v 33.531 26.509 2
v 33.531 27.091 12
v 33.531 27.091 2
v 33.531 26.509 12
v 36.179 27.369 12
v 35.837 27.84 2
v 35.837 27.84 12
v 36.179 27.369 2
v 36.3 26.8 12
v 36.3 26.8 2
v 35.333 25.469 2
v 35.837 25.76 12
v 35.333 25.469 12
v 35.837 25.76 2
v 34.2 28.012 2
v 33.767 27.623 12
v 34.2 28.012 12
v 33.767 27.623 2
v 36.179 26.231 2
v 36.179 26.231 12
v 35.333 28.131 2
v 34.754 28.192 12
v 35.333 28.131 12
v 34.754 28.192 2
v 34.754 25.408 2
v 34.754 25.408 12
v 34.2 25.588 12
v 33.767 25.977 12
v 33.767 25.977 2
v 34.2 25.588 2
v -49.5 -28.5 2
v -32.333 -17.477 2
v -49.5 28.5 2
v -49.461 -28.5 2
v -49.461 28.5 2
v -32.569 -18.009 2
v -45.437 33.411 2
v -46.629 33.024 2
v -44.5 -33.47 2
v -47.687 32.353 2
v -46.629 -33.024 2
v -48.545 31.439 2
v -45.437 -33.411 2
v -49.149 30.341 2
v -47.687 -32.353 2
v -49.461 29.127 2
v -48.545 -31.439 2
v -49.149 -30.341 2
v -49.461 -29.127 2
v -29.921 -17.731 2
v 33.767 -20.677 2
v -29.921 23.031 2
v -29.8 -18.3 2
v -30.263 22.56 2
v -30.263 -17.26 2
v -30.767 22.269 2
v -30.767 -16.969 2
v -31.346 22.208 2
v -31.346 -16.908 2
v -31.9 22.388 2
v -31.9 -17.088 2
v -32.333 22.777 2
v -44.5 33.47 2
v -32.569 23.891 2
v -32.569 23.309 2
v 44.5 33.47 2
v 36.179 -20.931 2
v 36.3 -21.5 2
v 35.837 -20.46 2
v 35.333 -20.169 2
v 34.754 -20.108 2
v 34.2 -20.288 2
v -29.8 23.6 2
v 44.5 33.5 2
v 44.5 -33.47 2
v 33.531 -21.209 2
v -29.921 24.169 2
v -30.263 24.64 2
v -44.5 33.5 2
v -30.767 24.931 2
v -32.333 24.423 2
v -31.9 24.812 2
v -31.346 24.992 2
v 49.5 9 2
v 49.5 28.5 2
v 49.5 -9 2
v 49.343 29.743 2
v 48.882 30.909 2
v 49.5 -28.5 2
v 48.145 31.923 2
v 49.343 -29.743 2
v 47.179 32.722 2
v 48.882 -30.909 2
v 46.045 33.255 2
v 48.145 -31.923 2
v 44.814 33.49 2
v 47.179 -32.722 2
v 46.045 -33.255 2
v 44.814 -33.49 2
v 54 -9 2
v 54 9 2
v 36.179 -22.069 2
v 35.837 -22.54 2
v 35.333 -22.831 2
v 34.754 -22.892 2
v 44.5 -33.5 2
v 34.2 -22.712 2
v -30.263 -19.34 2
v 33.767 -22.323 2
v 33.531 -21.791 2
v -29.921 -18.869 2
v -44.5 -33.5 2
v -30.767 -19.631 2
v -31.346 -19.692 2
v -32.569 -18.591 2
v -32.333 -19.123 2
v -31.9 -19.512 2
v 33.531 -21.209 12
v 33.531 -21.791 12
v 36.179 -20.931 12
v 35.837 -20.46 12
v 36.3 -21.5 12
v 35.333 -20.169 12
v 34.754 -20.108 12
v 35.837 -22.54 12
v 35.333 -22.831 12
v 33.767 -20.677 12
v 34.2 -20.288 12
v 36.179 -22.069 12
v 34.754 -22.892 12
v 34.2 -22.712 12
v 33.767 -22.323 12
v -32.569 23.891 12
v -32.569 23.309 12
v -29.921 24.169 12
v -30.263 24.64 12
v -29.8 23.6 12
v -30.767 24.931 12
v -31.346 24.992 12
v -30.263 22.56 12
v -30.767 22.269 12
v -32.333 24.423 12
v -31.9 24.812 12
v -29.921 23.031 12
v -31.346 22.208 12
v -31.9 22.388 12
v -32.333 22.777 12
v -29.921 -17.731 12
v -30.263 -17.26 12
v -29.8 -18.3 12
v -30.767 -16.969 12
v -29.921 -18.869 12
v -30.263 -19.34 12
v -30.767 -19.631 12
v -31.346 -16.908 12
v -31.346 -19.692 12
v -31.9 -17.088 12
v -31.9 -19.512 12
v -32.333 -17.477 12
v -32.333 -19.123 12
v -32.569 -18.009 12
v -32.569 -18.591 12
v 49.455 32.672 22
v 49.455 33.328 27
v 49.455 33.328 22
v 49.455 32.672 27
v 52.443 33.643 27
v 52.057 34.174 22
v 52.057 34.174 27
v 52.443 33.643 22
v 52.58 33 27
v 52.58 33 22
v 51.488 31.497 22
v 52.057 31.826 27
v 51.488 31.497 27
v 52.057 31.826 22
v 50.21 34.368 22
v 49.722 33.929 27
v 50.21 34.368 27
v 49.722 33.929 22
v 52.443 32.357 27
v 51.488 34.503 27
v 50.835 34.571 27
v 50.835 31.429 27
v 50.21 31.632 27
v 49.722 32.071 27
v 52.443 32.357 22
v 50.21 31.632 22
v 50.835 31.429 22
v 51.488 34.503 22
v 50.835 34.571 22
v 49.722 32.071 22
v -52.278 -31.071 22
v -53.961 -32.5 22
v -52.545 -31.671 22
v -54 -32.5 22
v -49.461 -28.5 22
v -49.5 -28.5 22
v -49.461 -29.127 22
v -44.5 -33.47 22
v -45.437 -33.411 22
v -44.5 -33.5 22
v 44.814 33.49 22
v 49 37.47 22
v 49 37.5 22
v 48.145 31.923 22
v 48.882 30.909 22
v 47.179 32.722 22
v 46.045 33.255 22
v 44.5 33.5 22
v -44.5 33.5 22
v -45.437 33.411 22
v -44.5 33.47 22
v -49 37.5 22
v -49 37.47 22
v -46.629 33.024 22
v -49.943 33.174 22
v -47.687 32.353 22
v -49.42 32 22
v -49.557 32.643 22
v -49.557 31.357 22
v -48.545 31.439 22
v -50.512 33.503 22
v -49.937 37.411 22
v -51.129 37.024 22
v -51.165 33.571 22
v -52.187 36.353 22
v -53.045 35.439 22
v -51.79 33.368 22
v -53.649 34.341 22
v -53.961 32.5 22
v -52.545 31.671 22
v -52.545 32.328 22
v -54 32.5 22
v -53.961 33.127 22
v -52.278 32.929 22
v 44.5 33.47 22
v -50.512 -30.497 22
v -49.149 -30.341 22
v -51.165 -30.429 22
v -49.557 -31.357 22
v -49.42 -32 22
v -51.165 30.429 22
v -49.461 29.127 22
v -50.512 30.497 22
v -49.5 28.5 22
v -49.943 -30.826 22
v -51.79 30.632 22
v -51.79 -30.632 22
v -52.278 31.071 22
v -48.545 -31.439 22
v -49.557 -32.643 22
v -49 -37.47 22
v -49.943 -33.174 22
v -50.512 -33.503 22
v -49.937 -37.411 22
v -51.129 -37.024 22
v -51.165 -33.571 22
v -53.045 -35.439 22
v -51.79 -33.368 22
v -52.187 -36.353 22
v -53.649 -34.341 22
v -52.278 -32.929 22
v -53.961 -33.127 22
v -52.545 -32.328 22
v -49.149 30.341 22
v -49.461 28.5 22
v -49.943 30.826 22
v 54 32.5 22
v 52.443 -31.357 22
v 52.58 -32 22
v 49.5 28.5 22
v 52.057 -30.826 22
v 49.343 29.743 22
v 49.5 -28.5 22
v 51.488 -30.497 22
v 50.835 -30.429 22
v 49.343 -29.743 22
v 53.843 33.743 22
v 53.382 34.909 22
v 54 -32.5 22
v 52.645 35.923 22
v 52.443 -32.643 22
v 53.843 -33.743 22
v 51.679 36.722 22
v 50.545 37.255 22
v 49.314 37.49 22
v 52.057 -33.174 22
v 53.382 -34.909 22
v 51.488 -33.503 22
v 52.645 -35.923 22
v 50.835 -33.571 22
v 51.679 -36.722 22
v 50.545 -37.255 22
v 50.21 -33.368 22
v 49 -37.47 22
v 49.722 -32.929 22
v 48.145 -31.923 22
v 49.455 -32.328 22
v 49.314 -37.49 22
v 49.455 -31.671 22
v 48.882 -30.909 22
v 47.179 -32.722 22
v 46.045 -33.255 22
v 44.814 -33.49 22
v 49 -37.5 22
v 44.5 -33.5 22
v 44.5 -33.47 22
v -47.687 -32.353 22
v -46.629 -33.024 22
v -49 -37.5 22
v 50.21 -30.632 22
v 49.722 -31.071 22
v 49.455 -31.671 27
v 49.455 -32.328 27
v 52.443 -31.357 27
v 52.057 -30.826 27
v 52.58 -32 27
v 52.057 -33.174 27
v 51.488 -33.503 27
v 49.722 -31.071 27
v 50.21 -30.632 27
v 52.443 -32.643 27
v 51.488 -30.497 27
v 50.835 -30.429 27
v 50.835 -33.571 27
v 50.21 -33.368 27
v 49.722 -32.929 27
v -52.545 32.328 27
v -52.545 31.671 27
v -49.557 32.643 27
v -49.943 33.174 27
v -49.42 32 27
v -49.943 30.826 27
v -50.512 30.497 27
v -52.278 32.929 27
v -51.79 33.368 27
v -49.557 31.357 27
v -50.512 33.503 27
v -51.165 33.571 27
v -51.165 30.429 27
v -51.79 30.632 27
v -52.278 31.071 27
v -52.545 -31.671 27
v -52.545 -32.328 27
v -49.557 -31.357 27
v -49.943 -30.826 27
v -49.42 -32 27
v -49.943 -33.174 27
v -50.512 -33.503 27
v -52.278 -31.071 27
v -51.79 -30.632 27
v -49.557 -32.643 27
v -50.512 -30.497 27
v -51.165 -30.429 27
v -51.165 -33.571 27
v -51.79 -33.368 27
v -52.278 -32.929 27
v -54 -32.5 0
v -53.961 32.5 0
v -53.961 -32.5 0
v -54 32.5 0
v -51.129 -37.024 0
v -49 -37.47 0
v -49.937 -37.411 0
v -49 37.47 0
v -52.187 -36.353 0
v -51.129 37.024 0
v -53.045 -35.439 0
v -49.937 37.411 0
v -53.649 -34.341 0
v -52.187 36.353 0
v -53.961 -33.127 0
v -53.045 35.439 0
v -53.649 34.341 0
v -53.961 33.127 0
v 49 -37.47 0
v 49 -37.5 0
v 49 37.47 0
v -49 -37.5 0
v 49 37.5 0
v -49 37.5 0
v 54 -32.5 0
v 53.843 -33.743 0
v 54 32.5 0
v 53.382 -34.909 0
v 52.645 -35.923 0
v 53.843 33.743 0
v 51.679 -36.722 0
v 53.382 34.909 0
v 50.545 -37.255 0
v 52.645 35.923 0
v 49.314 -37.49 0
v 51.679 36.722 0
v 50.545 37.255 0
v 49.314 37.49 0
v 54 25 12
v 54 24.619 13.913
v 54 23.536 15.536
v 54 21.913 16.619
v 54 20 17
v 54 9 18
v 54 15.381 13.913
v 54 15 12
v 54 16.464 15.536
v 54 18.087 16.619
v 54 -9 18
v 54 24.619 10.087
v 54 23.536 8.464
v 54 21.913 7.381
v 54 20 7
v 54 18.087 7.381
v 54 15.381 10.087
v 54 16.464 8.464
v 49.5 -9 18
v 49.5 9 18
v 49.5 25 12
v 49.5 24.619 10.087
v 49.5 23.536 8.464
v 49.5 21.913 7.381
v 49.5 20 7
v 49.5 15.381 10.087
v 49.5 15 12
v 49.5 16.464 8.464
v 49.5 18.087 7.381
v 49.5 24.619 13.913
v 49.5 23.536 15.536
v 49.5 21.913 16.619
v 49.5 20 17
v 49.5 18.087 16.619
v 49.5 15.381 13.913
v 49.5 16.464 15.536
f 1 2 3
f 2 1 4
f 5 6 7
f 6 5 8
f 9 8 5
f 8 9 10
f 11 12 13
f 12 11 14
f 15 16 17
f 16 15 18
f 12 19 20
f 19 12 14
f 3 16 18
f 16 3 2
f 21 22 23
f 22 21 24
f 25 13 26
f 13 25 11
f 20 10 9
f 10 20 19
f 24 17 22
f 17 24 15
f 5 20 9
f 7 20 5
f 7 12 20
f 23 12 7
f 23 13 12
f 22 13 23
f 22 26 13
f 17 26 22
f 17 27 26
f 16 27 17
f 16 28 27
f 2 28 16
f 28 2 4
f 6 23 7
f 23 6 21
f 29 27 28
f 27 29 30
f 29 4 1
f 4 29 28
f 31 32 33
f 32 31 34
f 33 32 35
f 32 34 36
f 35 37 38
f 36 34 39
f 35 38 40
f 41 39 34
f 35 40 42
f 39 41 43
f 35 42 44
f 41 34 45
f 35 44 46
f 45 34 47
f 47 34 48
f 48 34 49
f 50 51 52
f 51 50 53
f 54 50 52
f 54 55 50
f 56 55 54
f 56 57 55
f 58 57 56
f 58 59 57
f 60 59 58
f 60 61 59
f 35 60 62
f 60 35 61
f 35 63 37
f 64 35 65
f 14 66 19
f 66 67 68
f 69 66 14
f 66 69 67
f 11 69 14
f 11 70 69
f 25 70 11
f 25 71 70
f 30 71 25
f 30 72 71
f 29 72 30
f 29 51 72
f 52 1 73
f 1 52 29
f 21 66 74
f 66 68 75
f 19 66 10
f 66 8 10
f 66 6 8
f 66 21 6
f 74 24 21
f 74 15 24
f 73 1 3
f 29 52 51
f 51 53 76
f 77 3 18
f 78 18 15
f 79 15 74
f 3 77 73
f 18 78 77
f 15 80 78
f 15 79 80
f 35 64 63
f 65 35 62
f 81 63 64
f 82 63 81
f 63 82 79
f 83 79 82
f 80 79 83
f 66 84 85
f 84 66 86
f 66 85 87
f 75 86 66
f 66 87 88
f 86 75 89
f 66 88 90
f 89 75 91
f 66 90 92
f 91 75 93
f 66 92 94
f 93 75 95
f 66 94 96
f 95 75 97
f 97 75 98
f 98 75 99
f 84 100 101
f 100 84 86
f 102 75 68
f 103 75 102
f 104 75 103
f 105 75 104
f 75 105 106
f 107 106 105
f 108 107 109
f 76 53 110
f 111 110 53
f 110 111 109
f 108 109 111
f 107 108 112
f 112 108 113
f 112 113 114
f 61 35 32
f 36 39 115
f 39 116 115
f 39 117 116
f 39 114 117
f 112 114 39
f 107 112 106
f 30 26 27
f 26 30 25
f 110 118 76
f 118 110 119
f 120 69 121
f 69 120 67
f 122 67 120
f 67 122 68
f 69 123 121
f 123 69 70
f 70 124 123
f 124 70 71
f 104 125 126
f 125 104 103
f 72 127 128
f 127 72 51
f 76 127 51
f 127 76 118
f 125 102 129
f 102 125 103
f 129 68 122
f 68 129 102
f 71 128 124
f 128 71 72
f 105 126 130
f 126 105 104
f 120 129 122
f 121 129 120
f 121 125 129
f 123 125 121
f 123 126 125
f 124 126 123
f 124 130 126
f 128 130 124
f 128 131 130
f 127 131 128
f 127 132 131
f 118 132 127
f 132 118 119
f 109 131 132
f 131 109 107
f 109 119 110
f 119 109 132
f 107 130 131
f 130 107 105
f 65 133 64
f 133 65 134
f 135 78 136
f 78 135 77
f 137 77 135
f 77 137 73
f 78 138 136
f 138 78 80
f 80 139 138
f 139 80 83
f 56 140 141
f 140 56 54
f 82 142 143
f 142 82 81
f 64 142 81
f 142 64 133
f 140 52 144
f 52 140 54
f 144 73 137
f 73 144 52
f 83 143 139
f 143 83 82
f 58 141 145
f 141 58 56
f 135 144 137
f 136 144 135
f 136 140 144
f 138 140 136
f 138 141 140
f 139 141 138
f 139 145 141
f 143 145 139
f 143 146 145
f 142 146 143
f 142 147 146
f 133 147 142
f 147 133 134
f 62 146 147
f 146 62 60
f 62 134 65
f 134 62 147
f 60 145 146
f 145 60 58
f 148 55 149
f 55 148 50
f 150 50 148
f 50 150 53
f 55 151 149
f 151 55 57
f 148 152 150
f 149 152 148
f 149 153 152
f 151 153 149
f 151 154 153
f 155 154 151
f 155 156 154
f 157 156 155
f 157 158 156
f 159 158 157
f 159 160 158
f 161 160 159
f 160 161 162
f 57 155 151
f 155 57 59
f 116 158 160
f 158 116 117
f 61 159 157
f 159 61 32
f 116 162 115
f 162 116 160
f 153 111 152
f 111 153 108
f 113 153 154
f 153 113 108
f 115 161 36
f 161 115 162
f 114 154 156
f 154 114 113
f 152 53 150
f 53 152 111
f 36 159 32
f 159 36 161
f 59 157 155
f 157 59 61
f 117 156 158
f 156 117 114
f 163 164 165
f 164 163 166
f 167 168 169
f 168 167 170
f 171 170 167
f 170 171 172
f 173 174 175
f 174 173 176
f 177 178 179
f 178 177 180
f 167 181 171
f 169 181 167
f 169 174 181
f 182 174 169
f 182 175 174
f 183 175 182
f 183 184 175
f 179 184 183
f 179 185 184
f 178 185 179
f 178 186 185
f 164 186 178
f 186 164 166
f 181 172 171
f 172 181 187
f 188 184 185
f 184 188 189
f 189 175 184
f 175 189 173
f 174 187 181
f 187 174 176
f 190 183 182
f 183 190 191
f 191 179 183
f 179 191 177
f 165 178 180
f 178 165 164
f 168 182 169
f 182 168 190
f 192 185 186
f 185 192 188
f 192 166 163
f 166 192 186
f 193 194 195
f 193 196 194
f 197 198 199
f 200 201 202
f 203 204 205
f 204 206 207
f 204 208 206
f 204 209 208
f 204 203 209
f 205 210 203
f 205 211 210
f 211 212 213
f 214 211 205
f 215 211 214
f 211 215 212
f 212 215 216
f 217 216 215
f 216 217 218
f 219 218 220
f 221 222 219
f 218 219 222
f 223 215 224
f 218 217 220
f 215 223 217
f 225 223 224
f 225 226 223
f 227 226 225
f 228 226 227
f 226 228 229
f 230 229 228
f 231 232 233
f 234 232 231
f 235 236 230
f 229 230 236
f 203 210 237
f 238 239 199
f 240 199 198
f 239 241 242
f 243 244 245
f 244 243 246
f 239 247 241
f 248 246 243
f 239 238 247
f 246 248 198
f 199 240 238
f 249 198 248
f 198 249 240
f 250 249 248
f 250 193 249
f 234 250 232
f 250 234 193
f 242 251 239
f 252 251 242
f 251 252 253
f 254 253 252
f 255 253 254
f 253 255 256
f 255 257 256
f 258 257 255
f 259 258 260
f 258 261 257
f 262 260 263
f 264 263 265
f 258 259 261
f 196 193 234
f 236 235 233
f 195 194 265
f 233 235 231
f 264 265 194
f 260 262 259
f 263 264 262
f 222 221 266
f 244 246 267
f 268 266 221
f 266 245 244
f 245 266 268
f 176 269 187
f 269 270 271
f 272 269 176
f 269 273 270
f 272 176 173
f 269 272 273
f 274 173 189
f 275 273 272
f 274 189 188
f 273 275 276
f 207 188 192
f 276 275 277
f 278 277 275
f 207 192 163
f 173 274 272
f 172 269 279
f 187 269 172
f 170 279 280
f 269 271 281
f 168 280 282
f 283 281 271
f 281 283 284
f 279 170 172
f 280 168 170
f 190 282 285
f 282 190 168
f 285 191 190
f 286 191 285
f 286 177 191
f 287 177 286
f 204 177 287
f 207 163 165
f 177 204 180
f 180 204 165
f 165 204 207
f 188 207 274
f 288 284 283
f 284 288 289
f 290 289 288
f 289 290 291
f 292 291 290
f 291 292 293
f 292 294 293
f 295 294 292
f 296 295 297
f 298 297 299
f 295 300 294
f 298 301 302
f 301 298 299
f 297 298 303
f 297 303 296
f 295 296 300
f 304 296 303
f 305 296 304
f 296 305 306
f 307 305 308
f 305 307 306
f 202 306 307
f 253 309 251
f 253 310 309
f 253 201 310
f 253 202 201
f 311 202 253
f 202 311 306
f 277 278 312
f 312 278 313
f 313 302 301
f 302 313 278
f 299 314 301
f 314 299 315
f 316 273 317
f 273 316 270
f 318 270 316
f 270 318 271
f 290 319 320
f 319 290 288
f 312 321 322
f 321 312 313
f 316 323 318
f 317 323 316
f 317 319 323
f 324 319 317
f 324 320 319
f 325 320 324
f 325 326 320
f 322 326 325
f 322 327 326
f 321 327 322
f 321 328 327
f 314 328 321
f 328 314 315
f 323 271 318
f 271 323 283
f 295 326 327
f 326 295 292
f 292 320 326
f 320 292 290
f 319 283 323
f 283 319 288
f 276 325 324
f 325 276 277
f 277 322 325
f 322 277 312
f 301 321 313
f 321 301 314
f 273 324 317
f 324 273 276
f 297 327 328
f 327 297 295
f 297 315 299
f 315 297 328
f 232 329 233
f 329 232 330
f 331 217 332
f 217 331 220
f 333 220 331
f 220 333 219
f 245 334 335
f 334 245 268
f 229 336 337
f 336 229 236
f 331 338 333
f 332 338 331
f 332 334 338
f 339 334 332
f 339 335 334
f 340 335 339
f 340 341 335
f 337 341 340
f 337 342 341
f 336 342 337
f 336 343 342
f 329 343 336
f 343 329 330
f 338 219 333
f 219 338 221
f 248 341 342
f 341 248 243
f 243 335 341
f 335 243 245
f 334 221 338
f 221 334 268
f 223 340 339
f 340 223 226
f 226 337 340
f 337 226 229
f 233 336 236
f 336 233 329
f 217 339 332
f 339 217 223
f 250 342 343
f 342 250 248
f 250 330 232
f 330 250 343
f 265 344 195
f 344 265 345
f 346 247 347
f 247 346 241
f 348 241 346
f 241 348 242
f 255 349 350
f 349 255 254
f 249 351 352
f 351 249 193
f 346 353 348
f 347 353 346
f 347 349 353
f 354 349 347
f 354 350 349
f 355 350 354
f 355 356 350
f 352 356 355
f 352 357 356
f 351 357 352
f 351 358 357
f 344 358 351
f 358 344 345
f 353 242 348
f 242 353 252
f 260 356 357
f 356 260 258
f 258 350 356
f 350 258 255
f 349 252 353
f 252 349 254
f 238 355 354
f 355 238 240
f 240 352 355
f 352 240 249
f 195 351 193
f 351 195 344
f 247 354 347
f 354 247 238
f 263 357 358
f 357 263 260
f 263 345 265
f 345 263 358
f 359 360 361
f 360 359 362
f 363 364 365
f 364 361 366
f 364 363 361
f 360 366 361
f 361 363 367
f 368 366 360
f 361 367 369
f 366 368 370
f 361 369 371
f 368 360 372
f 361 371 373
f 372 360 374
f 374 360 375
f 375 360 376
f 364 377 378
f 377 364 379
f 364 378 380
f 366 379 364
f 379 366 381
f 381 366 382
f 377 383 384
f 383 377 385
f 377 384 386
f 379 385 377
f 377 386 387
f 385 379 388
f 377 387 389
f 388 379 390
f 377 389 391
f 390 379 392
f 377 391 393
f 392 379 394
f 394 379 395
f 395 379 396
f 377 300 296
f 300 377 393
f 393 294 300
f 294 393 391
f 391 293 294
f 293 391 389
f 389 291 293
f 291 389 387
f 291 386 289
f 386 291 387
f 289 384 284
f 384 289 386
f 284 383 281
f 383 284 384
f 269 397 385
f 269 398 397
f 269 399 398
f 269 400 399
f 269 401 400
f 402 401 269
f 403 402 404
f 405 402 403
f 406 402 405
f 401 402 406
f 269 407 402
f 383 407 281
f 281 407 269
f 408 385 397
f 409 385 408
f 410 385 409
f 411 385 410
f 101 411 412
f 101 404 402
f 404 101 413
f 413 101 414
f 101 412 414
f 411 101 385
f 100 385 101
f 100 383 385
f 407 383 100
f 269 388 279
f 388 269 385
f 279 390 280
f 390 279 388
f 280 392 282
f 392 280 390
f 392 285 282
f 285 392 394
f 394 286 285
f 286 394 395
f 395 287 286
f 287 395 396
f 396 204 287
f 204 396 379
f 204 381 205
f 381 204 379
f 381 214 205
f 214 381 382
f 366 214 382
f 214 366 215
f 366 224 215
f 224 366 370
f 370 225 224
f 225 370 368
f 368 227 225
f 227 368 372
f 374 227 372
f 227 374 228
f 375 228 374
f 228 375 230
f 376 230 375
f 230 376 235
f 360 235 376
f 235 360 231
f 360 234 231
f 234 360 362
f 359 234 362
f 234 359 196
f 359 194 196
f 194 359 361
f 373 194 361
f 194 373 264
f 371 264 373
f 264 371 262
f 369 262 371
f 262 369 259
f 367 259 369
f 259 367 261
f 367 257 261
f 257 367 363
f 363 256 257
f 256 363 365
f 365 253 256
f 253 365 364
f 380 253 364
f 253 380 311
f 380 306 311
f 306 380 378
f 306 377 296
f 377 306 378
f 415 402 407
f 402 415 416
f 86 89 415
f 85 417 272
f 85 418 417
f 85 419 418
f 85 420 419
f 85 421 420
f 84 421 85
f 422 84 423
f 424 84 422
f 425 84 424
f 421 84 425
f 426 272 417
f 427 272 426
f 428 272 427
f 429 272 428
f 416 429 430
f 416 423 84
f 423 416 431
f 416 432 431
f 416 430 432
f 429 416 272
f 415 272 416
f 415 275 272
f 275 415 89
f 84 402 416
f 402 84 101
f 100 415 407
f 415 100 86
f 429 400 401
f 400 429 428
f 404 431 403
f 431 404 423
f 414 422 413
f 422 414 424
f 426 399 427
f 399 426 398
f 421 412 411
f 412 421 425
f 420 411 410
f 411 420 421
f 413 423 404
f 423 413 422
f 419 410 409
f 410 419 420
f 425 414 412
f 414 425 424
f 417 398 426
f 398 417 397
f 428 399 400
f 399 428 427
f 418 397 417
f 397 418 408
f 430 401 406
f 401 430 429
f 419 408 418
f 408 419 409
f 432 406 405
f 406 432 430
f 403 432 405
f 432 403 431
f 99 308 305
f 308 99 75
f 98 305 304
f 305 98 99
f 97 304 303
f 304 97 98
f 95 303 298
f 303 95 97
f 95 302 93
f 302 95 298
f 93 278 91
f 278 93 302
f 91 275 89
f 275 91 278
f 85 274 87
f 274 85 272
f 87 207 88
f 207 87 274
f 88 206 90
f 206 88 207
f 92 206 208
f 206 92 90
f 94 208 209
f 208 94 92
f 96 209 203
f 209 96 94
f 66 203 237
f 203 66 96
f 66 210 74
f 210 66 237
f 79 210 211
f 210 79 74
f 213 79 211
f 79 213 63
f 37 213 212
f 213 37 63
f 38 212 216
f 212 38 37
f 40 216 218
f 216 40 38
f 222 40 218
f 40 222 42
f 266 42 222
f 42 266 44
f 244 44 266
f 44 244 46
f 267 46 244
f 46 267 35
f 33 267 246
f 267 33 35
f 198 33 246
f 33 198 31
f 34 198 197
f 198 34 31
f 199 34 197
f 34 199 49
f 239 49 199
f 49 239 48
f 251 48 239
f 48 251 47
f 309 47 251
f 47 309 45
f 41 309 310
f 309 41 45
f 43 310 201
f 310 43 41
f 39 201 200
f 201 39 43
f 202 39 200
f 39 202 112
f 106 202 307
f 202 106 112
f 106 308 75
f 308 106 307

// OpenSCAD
caseHeight = 22;
baseHeight = 2;
holeHeight = 10;
supportPos = [ [34.9,26.8,baseHeight ],
               [34.9,-21.5,baseHeight ],
               [-31.2,23.6,baseHeight ],
               [-31.2,-18.3,baseHeight ]];
               
holePos  = [ [51,33,caseHeight ],
               [51,-32,caseHeight ],
               [-51,32,caseHeight ],
               [-51,-32,caseHeight ]];

module roundedSquare(x,y,radius){
    circles = [ [x/2,y/2],[-x/2,y/2],[x/2,-y/2],[-x/2,-y/2] ];
    union(){
        square([x,y],center=true);
        for( i = circles ){
            translate( i ){
                circle( radius,$fn=25, center=true );
            }
        }
        for( i = [ -1, 1 ] ){
            translate([i*x/2,0]){
                square([radius*2,y],center=true);
            }
            translate([0,i*y/2]){
                square([x,radius*2],center=true);
            }
        }
        
        
    }
}
union(){
    
    for ( i = supportPos ){
        translate(i){
            #cylinder( $fn=15, r=1.4,h=10);
        }
    }
    
     for ( i = holePos ){
        translate(i){
            #cylinder( $fn=15, r=1.58,h=5);
        }
    }

    /*translate( [52,30]){
        rotate([0,0,180]){
            color([0,1,0])
            import("/Users/applepie/Downloads/BEAGLEBONE_BLACK.STL");
        }
    }*/

difference(){
union(){
 
linear_extrude(height = caseHeight, center = false, convexity = 10, slices = 10, scale = 1.0){
    roundedSquare( 98,65,5);
}



}

translate( [53,0,holeHeight]){
    cube([7,18,16],center=true);
}


translate( [53,20,holeHeight+2]){
    rotate([0,90,0]){
    cylinder(r=5,h=10,center=true);
}

}

translate( [0,0,baseHeight]){
    linear_extrude(height = 25, center = false, convexity = 10,  slices = 10, scale = 1.0){
        roundedSquare( 89,57,5);
    }
}
}
}
